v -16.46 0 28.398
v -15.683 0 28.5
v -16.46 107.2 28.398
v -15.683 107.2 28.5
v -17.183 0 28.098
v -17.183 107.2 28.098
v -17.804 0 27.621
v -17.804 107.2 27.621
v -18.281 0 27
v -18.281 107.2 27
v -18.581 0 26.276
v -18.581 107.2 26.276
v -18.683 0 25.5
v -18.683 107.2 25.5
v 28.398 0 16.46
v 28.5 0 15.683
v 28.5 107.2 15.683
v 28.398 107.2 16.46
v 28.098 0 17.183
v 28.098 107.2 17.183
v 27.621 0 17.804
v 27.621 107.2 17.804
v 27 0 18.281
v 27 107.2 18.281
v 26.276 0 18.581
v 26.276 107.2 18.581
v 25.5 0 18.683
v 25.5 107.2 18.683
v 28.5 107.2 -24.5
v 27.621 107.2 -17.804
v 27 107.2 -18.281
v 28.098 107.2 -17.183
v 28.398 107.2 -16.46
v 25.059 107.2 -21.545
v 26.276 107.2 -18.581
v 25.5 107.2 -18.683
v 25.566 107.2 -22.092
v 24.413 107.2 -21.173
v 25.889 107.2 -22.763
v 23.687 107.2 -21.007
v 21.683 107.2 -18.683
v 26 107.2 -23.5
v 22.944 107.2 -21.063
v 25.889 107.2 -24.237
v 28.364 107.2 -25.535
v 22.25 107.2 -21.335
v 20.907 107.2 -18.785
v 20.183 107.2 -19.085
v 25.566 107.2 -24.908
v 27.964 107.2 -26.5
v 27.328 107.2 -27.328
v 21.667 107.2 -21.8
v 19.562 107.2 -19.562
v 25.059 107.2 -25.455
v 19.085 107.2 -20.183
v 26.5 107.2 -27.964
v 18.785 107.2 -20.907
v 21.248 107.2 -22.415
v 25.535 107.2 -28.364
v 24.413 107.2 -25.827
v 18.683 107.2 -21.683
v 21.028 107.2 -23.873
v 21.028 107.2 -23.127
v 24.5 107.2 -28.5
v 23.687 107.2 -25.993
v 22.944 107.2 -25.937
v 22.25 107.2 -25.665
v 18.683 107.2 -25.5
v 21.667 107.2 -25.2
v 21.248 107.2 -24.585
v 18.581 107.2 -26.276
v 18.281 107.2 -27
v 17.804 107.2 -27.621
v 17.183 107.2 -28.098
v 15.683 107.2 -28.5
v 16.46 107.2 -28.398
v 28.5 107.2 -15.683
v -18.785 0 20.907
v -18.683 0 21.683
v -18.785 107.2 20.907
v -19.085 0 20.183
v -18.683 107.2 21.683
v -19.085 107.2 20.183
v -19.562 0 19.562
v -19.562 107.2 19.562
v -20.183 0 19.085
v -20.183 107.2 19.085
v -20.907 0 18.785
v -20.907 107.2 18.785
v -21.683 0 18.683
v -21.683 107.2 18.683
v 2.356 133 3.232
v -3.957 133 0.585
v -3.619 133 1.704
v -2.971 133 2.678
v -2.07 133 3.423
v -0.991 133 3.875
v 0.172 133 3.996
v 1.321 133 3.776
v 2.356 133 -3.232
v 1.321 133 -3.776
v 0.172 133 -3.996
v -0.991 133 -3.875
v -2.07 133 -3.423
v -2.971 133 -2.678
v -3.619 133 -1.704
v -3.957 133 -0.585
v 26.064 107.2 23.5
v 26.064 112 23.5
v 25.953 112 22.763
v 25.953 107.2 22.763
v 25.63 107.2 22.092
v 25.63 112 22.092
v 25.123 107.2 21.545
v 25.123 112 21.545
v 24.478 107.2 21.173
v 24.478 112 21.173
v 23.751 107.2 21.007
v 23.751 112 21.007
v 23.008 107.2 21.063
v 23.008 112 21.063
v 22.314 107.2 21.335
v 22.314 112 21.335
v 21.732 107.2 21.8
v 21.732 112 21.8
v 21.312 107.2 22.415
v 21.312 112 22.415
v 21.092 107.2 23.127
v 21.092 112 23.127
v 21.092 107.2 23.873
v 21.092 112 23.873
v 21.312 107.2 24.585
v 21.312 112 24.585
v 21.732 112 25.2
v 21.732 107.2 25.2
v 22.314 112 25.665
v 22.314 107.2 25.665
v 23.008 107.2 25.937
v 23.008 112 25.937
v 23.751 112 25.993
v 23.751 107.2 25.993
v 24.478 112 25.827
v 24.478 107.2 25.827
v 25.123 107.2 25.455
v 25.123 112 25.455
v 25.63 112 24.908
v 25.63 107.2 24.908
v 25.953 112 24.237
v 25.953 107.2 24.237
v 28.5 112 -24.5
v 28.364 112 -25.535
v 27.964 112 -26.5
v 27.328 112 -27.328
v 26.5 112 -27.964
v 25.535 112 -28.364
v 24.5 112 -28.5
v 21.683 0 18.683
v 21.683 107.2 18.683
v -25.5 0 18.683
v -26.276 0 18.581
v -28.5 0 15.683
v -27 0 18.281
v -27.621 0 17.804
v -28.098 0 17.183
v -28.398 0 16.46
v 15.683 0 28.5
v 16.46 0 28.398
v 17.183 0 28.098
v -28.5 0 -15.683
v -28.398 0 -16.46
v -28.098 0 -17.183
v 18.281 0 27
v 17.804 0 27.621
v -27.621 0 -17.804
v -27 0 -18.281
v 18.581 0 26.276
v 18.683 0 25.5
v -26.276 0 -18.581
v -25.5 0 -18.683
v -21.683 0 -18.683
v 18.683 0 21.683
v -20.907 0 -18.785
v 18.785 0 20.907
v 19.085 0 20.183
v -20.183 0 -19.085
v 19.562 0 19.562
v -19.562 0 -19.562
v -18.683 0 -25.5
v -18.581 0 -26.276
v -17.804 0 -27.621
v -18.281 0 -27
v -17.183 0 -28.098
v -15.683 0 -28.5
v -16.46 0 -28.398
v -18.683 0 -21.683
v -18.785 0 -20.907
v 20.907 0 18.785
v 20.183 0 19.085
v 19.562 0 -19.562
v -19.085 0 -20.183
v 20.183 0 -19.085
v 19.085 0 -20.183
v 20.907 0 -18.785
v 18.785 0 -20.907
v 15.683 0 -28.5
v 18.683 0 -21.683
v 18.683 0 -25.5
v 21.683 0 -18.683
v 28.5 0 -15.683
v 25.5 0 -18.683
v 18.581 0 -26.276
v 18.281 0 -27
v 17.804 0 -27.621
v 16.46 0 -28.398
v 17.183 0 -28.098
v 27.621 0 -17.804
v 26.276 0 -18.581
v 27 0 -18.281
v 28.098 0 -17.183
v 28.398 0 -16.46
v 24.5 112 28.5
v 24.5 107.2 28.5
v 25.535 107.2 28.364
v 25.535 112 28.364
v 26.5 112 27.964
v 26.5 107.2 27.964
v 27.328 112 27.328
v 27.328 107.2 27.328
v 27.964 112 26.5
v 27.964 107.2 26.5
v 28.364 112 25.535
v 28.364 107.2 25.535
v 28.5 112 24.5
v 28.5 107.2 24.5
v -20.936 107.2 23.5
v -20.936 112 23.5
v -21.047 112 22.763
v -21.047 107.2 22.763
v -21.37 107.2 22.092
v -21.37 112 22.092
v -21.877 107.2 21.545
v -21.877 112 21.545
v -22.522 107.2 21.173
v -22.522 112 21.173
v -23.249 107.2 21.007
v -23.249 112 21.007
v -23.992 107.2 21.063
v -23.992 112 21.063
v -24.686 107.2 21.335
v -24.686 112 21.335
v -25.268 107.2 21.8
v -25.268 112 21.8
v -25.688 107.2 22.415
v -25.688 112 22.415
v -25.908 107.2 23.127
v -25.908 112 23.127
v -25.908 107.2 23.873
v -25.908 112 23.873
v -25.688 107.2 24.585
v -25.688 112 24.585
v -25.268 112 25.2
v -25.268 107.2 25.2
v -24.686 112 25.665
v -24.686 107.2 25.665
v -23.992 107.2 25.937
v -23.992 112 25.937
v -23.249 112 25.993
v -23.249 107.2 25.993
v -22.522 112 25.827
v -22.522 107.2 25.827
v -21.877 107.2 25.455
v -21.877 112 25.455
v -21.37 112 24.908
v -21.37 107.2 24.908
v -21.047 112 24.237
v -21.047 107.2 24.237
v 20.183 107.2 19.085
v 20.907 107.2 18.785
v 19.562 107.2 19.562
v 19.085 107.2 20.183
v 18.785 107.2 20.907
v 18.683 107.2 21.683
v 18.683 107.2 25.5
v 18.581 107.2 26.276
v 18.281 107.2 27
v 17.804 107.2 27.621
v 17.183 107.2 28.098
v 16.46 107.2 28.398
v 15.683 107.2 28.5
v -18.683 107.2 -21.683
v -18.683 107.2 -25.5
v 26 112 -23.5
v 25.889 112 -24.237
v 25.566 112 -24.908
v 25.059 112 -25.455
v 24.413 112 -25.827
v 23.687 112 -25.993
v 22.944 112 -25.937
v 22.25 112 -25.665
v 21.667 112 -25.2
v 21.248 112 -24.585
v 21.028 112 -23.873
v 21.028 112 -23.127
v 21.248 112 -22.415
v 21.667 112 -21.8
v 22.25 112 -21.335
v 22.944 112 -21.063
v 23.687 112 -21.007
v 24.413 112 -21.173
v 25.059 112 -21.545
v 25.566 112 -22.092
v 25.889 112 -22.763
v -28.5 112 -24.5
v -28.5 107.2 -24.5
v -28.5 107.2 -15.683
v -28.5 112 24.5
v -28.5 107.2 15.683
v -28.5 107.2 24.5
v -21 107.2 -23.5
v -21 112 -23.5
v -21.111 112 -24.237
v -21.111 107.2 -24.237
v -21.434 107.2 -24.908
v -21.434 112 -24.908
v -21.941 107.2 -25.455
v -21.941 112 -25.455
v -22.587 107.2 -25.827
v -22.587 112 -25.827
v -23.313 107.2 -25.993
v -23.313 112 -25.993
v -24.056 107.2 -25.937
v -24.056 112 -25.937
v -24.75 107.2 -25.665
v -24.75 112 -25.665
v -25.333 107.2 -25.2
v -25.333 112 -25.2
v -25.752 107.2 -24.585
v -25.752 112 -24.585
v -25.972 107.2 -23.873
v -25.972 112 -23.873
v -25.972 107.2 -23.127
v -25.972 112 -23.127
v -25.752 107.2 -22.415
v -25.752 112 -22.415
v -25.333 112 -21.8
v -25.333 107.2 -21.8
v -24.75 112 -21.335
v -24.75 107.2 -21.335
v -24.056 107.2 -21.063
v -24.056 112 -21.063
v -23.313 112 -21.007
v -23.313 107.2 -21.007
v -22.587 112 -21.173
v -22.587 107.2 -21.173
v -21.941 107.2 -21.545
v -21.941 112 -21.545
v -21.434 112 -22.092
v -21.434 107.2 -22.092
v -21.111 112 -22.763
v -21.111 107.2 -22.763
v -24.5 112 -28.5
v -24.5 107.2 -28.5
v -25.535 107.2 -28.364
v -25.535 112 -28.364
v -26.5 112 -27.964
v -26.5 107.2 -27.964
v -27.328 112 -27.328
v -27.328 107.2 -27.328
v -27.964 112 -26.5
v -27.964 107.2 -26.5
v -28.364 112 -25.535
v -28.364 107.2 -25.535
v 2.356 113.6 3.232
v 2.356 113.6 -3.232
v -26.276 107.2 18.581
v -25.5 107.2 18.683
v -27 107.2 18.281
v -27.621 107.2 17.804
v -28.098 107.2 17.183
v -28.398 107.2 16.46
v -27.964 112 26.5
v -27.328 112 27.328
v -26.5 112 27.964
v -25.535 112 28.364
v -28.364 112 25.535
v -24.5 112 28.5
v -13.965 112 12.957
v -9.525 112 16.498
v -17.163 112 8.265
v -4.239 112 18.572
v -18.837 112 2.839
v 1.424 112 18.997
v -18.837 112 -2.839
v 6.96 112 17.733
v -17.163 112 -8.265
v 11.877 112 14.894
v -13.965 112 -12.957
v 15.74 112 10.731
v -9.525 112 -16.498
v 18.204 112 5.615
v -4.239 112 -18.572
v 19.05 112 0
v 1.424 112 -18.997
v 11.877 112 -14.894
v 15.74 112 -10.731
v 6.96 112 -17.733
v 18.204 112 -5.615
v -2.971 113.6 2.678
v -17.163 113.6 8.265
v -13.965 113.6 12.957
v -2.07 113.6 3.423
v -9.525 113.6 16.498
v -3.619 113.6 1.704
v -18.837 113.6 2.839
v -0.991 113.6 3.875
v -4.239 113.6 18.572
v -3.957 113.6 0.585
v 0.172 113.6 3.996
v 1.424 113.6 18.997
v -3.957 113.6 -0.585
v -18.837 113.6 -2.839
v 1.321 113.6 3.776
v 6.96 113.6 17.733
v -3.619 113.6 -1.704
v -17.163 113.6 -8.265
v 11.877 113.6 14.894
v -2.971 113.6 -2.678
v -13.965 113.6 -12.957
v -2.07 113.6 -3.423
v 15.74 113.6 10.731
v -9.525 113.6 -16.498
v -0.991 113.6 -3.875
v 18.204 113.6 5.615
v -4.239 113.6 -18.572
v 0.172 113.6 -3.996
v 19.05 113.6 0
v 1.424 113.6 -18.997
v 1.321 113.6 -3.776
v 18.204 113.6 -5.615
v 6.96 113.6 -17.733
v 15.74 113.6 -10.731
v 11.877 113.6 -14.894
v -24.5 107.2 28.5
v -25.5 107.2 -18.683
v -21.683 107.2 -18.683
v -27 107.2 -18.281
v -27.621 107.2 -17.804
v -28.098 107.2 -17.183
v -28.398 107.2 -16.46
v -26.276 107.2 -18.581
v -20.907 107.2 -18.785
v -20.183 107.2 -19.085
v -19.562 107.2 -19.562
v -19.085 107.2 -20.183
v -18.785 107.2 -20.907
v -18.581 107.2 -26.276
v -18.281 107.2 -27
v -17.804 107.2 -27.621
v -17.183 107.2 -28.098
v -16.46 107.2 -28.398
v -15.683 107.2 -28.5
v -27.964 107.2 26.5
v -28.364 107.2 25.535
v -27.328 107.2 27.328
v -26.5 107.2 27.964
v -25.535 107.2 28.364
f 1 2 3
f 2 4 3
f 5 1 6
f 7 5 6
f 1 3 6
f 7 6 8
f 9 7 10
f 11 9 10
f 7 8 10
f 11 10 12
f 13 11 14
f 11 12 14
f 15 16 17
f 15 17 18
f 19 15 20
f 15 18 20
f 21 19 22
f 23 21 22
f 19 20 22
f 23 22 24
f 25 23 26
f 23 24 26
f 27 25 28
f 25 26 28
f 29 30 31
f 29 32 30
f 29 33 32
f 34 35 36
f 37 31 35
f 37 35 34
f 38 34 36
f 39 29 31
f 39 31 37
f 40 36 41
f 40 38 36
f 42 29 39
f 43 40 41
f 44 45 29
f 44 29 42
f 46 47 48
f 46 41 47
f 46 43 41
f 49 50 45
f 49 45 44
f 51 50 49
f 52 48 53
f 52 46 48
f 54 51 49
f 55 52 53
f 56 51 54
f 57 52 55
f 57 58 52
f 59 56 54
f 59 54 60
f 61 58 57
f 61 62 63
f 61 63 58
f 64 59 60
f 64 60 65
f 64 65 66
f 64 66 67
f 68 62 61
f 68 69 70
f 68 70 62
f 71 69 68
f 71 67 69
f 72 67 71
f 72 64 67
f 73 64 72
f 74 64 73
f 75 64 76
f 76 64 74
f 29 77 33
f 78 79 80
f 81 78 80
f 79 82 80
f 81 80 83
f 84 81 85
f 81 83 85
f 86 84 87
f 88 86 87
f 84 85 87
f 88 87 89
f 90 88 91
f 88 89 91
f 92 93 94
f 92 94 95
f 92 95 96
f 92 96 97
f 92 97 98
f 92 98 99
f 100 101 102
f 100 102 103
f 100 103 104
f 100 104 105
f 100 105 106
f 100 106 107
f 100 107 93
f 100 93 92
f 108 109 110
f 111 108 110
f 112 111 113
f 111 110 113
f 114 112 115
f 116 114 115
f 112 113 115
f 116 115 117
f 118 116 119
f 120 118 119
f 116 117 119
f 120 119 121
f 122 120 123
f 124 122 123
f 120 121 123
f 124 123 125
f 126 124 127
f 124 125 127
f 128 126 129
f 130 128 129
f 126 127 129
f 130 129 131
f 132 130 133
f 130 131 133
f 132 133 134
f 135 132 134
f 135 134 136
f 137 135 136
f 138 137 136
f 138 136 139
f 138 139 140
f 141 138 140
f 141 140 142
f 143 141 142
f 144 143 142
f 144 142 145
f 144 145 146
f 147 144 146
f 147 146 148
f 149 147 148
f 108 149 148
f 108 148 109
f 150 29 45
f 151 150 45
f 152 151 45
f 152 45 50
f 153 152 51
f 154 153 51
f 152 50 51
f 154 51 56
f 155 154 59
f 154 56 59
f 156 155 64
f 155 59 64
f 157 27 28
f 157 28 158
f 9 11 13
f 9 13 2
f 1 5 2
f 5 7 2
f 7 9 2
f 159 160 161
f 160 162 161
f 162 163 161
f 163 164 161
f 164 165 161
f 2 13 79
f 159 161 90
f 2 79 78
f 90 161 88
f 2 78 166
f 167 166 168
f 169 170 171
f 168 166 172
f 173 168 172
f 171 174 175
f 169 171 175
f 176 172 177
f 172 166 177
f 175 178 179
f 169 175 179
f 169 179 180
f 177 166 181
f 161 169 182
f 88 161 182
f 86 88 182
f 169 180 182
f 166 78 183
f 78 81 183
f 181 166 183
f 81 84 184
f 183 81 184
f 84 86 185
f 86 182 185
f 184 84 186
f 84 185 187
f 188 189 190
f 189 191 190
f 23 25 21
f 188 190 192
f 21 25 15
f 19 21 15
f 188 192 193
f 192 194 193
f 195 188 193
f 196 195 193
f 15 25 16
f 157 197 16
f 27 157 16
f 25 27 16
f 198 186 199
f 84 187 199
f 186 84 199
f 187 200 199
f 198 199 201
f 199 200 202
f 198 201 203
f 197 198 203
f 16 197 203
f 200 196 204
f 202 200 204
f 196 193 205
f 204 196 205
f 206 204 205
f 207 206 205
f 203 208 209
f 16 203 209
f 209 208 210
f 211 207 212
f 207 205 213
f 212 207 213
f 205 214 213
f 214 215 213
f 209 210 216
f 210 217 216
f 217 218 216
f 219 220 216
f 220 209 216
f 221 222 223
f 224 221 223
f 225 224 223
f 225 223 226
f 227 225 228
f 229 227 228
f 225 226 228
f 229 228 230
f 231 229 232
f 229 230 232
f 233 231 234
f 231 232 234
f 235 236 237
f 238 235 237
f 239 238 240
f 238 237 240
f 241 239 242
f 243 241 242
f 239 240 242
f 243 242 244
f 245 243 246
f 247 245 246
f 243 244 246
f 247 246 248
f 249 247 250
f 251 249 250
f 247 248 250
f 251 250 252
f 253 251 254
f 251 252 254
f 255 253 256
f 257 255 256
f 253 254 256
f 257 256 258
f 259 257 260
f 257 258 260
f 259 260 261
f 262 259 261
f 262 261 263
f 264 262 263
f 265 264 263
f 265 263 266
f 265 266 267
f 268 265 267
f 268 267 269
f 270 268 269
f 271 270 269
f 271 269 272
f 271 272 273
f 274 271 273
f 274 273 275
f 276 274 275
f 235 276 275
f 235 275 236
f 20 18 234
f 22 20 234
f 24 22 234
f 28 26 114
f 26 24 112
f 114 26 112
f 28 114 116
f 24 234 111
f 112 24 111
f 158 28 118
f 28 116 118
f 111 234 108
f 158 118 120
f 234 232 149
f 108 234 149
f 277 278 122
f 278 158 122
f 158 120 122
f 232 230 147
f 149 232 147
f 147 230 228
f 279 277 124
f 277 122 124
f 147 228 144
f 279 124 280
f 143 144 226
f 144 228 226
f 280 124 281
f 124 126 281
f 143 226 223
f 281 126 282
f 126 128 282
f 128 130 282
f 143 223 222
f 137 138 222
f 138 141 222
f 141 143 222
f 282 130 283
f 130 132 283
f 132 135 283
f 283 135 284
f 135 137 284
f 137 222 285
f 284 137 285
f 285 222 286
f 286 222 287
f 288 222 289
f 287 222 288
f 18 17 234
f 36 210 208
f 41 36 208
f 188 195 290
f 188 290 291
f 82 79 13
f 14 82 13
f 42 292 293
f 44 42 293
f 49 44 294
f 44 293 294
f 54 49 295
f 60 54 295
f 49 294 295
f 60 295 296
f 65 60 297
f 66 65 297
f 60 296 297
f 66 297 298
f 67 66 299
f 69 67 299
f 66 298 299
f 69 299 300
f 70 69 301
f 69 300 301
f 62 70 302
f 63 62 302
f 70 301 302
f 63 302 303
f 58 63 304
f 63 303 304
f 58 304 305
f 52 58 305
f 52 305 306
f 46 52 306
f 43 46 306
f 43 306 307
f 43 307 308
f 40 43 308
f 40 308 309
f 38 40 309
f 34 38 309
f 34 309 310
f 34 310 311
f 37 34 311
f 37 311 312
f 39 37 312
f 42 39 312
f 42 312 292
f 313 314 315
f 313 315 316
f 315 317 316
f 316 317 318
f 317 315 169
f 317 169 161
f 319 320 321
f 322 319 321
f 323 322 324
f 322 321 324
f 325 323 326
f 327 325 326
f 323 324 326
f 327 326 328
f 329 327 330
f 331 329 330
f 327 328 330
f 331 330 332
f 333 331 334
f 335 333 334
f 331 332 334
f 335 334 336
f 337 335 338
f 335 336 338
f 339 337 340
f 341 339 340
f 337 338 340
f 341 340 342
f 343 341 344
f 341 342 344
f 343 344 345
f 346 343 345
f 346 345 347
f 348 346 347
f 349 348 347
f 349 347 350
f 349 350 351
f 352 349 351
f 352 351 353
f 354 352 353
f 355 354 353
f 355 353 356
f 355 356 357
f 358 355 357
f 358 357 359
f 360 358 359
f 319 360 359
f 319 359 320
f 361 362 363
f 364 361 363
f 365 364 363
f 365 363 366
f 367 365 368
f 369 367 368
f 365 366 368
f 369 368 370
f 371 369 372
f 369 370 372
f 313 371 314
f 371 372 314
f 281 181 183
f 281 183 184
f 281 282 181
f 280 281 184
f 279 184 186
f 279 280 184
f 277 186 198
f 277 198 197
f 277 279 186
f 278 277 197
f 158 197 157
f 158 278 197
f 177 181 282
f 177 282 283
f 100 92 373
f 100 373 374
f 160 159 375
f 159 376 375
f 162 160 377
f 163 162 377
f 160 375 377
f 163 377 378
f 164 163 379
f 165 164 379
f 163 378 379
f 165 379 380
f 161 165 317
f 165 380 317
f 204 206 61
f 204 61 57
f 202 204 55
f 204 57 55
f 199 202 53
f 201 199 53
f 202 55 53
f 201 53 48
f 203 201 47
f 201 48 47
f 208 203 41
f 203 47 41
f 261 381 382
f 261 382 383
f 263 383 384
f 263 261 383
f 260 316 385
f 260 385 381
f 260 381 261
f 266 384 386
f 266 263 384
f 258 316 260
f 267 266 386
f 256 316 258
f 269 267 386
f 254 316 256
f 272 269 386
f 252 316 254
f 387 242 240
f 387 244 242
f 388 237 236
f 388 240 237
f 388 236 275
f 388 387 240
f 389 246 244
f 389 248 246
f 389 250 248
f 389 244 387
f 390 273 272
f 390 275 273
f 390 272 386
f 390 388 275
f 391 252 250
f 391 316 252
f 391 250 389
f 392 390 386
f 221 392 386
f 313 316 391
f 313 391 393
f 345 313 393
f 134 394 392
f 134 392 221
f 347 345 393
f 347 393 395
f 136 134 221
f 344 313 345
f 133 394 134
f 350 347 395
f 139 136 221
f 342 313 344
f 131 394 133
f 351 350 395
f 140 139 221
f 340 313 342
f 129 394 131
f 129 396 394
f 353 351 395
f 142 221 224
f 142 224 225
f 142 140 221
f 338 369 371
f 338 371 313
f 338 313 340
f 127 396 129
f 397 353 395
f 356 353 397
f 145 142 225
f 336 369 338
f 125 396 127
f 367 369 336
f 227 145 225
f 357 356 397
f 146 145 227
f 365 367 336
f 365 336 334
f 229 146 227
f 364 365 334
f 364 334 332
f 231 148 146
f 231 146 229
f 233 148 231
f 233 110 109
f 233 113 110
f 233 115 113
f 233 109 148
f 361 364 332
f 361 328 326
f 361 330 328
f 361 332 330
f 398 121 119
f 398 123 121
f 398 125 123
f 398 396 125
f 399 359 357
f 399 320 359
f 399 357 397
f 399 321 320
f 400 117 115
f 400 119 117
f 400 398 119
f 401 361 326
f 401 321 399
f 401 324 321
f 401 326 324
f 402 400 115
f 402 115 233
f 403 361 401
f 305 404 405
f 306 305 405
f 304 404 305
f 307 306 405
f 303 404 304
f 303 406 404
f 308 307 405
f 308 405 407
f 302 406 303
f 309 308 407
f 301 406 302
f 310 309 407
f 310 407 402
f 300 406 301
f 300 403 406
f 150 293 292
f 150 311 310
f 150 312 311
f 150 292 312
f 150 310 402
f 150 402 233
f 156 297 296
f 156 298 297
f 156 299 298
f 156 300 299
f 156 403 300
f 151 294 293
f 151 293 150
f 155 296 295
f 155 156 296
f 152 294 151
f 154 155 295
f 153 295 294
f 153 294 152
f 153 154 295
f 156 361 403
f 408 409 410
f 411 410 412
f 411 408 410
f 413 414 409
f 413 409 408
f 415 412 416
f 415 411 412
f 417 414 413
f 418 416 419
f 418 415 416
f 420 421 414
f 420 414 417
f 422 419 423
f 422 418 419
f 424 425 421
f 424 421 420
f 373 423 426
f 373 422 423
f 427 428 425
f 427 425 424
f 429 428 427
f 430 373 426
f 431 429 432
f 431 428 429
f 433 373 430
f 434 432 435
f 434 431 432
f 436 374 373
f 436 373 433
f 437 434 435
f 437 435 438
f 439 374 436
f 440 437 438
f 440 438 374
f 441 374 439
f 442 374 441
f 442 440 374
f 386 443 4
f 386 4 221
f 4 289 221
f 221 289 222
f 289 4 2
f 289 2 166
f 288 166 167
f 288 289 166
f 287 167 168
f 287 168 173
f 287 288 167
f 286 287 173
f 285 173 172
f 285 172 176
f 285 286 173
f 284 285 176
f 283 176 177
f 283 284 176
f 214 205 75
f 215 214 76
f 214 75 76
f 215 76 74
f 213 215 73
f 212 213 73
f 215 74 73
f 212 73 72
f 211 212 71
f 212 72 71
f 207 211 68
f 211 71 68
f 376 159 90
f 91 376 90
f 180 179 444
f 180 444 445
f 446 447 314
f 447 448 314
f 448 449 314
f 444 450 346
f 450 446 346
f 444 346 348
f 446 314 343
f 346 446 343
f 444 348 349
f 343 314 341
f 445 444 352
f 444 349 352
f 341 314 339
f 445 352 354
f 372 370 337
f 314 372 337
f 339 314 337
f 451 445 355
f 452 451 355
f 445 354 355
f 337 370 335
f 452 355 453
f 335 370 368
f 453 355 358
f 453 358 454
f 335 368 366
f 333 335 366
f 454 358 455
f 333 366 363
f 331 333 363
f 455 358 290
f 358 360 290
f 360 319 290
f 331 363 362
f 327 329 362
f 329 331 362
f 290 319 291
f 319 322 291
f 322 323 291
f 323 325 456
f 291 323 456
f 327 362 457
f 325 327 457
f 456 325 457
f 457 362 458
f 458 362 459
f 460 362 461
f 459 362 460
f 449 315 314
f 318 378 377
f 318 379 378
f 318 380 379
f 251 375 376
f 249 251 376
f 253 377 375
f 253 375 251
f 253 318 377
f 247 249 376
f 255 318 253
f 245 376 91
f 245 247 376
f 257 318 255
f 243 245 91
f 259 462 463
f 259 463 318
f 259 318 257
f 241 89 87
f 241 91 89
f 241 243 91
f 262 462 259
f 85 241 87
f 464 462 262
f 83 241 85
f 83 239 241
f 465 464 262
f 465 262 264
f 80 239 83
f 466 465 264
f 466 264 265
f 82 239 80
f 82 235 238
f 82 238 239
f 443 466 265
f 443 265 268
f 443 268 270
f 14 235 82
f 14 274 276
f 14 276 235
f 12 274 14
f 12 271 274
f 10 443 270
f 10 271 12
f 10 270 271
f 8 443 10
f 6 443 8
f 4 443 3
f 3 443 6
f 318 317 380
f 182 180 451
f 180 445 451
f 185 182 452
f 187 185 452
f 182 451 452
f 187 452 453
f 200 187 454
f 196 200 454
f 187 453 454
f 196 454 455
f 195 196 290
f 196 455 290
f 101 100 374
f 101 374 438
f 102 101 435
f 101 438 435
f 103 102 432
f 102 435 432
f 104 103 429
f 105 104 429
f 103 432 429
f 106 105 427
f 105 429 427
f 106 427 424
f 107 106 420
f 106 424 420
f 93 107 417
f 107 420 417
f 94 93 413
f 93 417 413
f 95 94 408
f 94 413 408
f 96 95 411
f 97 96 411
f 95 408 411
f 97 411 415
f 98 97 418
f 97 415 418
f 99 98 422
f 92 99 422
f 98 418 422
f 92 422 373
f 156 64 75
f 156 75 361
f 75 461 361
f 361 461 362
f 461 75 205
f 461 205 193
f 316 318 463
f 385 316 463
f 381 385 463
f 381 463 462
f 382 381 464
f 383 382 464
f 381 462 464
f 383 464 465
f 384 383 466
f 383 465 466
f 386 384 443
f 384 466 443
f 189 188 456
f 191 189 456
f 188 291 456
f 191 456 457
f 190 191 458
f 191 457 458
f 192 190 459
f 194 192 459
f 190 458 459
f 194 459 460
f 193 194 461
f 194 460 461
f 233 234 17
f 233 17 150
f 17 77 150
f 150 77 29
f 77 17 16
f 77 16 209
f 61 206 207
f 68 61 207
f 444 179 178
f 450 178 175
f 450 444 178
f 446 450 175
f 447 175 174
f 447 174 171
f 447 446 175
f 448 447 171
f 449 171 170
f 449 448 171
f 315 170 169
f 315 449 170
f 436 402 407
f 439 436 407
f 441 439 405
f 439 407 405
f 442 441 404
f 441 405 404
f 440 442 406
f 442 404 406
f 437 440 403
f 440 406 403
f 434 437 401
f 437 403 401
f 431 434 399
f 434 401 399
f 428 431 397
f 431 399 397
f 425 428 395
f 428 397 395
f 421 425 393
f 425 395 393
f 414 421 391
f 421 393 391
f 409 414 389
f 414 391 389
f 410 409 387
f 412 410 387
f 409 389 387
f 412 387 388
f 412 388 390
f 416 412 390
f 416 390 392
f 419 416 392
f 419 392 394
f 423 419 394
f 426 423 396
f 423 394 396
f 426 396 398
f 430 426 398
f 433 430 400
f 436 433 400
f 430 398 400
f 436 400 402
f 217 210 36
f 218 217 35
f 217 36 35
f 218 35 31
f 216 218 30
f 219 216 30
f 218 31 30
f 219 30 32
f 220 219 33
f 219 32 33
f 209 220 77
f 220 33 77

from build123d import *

# Parameters (mm, degrees)
BOSS_EXTRUDE1_DEPTH  = 112
SKETCH2_R            = 19.05
BOSS_EXTRUDE2_DEPTH  = 1.6
SKETCH3_R            = 4
BOSS_EXTRUDE3_DEPTH  = 19.4
SKETCH4_W            = 7.896046337
SKETCH4_H            = 7.324948646
CUT_EXTRUDE1_DEPTH   = 19.4
CUT_EXTRUDE2_DEPTH   = 107.2
MIRROR2_COPY_1_DEPTH = 107.2
FILLET1_R            = 3
SKETCH6_R            = 2.5
CUT_EXTRUDE3_DEPTH   = 107.2


with BuildPart() as part:
    # Sketch1 → Boss-Extrude1 (new body)
    with BuildSketch(Plane(origin=(0, 0, 0), x_dir=(1, 0, 0), z_dir=(0, 1, 0))):
        with BuildLine():
            Line((-24.5, -28.5), (24.5, -28.5))
            ThreePointArc((24.5, -28.5), (27.328427125, -27.328427125), (28.5, -24.5))
            Line((28.5, -24.5), (28.5, 24.5))
            ThreePointArc((28.5, 24.5), (27.328427125, 27.328427125), (24.5, 28.5))
            Line((24.5, 28.5), (-24.5, 28.5))
            ThreePointArc((-24.5, 28.5), (-27.328427125, 27.328427125), (-28.5, 24.5))
            Line((-28.5, 24.5), (-28.5, -24.5))
            ThreePointArc((-28.5, -24.5), (-27.328427125, -27.328427125), (-24.5, -28.5))
        make_face()
    extrude(amount=BOSS_EXTRUDE1_DEPTH)

    # Sketch2 → Boss-Extrude2 (add)
    with BuildSketch(Plane(origin=(0, 112, 0), x_dir=(1, 0, 0), z_dir=(0, 1, 0))):
        Circle(SKETCH2_R)
    extrude(amount=BOSS_EXTRUDE2_DEPTH)

    # Sketch3 → Boss-Extrude3 (add)
    with BuildSketch(Plane(origin=(0, 113.6, 0), x_dir=(1, 0, 0), z_dir=(0, 1, 0))):
        Circle(SKETCH3_R)
    extrude(amount=BOSS_EXTRUDE3_DEPTH)

    # Sketch4 → Cut-Extrude1 (cut)
    with BuildSketch(Plane(origin=(0, 133, 0), x_dir=(1, 0, 0), z_dir=(0, 1, 0))):
        with Locations((6.304367274, 0.076945889)):
            Rectangle(SKETCH4_W, SKETCH4_H)
    extrude(amount=-CUT_EXTRUDE1_DEPTH, mode=Mode.SUBTRACT)

    # Sketch5 → Cut-Extrude2 (cut)
    with BuildSketch(Plane.XZ):
        with BuildLine():
            Line((-28.5, 24.5), (-28.5, 18.683107864))
            Line((-28.5, 18.683107864), (-18.683107864, 18.683107864))
            Line((-18.683107864, 18.683107864), (-18.683107864, 28.5))
            Line((-18.683107864, 28.5), (-24.5, 28.5))
            ThreePointArc((-24.5, 28.5), (-27.328427125, 27.328427125), (-28.5, 24.5))
        make_face()
    cut_extrude2 = extrude(amount=-CUT_EXTRUDE2_DEPTH, mode=Mode.SUBTRACT)

    # Mirror1: Cut-Extrude2 across plane
    add(cut_extrude2.mirror(Plane(origin=(0, 0, 0), x_dir=(0, 0, 1), z_dir=(1, 0, 0))), mode=Mode.SUBTRACT)

    # Mirror2: Cut-Extrude2 across plane
    add(cut_extrude2.mirror(Plane.XY), mode=Mode.SUBTRACT)

    # Mirror2 copy 1 sketch → Mirror2 copy 1 (cut)
    with BuildSketch(Plane(origin=(0, 0, 0), x_dir=(-1, 0, 0), z_dir=(0, -1, 0))):
        with BuildLine():
            Line((-28.5, 24.5), (-28.5, 18.683107864))
            Line((-28.5, 18.683107864), (-18.683107864, 18.683107864))
            Line((-18.683107864, 18.683107864), (-18.683107864, 28.5))
            Line((-18.683107864, 28.5), (-24.5, 28.5))
            ThreePointArc((-24.5, 28.5), (-27.328427125, 27.328427125), (-28.5, 24.5))
        make_face()
    extrude(amount=-MIRROR2_COPY_1_DEPTH, mode=Mode.SUBTRACT)

    # Fillet1
    fillet1_edges = [part.edges().sort_by_distance(p)[0] for p in [
        (-18.683107864, 53.6, -18.683107864),
        (-18.683107864, 53.6, -28.5),
        (-28.5, 53.6, -18.683107864),
        (-18.683107864, 53.6, 28.5),
        (-18.683107864, 53.6, 18.683107864),
        (-28.5, 53.6, 18.683107864),
        (18.683107864, 53.6, 18.683107864),
        (18.683107864, 53.6, 28.5),
        (28.5, 53.6, 18.683107864),
        (18.683107864, 53.6, -28.5),
        (18.683107864, 53.6, -18.683107864),
        (28.5, 53.6, -18.683107864),
    ]]
    fillet(fillet1_edges, radius=FILLET1_R)

    # Sketch6 → Cut-Extrude3 (cut)
    with BuildSketch(Plane(origin=(0, 112, 0), x_dir=(1, 0, 0), z_dir=(0, 1, 0))):
        with Locations((23.5, 23.5)):
            Circle(SKETCH6_R)
        with Locations((23.564387561, -23.499955896)):
            Circle(SKETCH6_R)
        with Locations((-23.5, 23.5)):
            Circle(SKETCH6_R)
        with Locations((-23.435612439, -23.5)):
            Circle(SKETCH6_R)
    extrude(amount=-CUT_EXTRUDE3_DEPTH, mode=Mode.SUBTRACT)


solid = part.part
